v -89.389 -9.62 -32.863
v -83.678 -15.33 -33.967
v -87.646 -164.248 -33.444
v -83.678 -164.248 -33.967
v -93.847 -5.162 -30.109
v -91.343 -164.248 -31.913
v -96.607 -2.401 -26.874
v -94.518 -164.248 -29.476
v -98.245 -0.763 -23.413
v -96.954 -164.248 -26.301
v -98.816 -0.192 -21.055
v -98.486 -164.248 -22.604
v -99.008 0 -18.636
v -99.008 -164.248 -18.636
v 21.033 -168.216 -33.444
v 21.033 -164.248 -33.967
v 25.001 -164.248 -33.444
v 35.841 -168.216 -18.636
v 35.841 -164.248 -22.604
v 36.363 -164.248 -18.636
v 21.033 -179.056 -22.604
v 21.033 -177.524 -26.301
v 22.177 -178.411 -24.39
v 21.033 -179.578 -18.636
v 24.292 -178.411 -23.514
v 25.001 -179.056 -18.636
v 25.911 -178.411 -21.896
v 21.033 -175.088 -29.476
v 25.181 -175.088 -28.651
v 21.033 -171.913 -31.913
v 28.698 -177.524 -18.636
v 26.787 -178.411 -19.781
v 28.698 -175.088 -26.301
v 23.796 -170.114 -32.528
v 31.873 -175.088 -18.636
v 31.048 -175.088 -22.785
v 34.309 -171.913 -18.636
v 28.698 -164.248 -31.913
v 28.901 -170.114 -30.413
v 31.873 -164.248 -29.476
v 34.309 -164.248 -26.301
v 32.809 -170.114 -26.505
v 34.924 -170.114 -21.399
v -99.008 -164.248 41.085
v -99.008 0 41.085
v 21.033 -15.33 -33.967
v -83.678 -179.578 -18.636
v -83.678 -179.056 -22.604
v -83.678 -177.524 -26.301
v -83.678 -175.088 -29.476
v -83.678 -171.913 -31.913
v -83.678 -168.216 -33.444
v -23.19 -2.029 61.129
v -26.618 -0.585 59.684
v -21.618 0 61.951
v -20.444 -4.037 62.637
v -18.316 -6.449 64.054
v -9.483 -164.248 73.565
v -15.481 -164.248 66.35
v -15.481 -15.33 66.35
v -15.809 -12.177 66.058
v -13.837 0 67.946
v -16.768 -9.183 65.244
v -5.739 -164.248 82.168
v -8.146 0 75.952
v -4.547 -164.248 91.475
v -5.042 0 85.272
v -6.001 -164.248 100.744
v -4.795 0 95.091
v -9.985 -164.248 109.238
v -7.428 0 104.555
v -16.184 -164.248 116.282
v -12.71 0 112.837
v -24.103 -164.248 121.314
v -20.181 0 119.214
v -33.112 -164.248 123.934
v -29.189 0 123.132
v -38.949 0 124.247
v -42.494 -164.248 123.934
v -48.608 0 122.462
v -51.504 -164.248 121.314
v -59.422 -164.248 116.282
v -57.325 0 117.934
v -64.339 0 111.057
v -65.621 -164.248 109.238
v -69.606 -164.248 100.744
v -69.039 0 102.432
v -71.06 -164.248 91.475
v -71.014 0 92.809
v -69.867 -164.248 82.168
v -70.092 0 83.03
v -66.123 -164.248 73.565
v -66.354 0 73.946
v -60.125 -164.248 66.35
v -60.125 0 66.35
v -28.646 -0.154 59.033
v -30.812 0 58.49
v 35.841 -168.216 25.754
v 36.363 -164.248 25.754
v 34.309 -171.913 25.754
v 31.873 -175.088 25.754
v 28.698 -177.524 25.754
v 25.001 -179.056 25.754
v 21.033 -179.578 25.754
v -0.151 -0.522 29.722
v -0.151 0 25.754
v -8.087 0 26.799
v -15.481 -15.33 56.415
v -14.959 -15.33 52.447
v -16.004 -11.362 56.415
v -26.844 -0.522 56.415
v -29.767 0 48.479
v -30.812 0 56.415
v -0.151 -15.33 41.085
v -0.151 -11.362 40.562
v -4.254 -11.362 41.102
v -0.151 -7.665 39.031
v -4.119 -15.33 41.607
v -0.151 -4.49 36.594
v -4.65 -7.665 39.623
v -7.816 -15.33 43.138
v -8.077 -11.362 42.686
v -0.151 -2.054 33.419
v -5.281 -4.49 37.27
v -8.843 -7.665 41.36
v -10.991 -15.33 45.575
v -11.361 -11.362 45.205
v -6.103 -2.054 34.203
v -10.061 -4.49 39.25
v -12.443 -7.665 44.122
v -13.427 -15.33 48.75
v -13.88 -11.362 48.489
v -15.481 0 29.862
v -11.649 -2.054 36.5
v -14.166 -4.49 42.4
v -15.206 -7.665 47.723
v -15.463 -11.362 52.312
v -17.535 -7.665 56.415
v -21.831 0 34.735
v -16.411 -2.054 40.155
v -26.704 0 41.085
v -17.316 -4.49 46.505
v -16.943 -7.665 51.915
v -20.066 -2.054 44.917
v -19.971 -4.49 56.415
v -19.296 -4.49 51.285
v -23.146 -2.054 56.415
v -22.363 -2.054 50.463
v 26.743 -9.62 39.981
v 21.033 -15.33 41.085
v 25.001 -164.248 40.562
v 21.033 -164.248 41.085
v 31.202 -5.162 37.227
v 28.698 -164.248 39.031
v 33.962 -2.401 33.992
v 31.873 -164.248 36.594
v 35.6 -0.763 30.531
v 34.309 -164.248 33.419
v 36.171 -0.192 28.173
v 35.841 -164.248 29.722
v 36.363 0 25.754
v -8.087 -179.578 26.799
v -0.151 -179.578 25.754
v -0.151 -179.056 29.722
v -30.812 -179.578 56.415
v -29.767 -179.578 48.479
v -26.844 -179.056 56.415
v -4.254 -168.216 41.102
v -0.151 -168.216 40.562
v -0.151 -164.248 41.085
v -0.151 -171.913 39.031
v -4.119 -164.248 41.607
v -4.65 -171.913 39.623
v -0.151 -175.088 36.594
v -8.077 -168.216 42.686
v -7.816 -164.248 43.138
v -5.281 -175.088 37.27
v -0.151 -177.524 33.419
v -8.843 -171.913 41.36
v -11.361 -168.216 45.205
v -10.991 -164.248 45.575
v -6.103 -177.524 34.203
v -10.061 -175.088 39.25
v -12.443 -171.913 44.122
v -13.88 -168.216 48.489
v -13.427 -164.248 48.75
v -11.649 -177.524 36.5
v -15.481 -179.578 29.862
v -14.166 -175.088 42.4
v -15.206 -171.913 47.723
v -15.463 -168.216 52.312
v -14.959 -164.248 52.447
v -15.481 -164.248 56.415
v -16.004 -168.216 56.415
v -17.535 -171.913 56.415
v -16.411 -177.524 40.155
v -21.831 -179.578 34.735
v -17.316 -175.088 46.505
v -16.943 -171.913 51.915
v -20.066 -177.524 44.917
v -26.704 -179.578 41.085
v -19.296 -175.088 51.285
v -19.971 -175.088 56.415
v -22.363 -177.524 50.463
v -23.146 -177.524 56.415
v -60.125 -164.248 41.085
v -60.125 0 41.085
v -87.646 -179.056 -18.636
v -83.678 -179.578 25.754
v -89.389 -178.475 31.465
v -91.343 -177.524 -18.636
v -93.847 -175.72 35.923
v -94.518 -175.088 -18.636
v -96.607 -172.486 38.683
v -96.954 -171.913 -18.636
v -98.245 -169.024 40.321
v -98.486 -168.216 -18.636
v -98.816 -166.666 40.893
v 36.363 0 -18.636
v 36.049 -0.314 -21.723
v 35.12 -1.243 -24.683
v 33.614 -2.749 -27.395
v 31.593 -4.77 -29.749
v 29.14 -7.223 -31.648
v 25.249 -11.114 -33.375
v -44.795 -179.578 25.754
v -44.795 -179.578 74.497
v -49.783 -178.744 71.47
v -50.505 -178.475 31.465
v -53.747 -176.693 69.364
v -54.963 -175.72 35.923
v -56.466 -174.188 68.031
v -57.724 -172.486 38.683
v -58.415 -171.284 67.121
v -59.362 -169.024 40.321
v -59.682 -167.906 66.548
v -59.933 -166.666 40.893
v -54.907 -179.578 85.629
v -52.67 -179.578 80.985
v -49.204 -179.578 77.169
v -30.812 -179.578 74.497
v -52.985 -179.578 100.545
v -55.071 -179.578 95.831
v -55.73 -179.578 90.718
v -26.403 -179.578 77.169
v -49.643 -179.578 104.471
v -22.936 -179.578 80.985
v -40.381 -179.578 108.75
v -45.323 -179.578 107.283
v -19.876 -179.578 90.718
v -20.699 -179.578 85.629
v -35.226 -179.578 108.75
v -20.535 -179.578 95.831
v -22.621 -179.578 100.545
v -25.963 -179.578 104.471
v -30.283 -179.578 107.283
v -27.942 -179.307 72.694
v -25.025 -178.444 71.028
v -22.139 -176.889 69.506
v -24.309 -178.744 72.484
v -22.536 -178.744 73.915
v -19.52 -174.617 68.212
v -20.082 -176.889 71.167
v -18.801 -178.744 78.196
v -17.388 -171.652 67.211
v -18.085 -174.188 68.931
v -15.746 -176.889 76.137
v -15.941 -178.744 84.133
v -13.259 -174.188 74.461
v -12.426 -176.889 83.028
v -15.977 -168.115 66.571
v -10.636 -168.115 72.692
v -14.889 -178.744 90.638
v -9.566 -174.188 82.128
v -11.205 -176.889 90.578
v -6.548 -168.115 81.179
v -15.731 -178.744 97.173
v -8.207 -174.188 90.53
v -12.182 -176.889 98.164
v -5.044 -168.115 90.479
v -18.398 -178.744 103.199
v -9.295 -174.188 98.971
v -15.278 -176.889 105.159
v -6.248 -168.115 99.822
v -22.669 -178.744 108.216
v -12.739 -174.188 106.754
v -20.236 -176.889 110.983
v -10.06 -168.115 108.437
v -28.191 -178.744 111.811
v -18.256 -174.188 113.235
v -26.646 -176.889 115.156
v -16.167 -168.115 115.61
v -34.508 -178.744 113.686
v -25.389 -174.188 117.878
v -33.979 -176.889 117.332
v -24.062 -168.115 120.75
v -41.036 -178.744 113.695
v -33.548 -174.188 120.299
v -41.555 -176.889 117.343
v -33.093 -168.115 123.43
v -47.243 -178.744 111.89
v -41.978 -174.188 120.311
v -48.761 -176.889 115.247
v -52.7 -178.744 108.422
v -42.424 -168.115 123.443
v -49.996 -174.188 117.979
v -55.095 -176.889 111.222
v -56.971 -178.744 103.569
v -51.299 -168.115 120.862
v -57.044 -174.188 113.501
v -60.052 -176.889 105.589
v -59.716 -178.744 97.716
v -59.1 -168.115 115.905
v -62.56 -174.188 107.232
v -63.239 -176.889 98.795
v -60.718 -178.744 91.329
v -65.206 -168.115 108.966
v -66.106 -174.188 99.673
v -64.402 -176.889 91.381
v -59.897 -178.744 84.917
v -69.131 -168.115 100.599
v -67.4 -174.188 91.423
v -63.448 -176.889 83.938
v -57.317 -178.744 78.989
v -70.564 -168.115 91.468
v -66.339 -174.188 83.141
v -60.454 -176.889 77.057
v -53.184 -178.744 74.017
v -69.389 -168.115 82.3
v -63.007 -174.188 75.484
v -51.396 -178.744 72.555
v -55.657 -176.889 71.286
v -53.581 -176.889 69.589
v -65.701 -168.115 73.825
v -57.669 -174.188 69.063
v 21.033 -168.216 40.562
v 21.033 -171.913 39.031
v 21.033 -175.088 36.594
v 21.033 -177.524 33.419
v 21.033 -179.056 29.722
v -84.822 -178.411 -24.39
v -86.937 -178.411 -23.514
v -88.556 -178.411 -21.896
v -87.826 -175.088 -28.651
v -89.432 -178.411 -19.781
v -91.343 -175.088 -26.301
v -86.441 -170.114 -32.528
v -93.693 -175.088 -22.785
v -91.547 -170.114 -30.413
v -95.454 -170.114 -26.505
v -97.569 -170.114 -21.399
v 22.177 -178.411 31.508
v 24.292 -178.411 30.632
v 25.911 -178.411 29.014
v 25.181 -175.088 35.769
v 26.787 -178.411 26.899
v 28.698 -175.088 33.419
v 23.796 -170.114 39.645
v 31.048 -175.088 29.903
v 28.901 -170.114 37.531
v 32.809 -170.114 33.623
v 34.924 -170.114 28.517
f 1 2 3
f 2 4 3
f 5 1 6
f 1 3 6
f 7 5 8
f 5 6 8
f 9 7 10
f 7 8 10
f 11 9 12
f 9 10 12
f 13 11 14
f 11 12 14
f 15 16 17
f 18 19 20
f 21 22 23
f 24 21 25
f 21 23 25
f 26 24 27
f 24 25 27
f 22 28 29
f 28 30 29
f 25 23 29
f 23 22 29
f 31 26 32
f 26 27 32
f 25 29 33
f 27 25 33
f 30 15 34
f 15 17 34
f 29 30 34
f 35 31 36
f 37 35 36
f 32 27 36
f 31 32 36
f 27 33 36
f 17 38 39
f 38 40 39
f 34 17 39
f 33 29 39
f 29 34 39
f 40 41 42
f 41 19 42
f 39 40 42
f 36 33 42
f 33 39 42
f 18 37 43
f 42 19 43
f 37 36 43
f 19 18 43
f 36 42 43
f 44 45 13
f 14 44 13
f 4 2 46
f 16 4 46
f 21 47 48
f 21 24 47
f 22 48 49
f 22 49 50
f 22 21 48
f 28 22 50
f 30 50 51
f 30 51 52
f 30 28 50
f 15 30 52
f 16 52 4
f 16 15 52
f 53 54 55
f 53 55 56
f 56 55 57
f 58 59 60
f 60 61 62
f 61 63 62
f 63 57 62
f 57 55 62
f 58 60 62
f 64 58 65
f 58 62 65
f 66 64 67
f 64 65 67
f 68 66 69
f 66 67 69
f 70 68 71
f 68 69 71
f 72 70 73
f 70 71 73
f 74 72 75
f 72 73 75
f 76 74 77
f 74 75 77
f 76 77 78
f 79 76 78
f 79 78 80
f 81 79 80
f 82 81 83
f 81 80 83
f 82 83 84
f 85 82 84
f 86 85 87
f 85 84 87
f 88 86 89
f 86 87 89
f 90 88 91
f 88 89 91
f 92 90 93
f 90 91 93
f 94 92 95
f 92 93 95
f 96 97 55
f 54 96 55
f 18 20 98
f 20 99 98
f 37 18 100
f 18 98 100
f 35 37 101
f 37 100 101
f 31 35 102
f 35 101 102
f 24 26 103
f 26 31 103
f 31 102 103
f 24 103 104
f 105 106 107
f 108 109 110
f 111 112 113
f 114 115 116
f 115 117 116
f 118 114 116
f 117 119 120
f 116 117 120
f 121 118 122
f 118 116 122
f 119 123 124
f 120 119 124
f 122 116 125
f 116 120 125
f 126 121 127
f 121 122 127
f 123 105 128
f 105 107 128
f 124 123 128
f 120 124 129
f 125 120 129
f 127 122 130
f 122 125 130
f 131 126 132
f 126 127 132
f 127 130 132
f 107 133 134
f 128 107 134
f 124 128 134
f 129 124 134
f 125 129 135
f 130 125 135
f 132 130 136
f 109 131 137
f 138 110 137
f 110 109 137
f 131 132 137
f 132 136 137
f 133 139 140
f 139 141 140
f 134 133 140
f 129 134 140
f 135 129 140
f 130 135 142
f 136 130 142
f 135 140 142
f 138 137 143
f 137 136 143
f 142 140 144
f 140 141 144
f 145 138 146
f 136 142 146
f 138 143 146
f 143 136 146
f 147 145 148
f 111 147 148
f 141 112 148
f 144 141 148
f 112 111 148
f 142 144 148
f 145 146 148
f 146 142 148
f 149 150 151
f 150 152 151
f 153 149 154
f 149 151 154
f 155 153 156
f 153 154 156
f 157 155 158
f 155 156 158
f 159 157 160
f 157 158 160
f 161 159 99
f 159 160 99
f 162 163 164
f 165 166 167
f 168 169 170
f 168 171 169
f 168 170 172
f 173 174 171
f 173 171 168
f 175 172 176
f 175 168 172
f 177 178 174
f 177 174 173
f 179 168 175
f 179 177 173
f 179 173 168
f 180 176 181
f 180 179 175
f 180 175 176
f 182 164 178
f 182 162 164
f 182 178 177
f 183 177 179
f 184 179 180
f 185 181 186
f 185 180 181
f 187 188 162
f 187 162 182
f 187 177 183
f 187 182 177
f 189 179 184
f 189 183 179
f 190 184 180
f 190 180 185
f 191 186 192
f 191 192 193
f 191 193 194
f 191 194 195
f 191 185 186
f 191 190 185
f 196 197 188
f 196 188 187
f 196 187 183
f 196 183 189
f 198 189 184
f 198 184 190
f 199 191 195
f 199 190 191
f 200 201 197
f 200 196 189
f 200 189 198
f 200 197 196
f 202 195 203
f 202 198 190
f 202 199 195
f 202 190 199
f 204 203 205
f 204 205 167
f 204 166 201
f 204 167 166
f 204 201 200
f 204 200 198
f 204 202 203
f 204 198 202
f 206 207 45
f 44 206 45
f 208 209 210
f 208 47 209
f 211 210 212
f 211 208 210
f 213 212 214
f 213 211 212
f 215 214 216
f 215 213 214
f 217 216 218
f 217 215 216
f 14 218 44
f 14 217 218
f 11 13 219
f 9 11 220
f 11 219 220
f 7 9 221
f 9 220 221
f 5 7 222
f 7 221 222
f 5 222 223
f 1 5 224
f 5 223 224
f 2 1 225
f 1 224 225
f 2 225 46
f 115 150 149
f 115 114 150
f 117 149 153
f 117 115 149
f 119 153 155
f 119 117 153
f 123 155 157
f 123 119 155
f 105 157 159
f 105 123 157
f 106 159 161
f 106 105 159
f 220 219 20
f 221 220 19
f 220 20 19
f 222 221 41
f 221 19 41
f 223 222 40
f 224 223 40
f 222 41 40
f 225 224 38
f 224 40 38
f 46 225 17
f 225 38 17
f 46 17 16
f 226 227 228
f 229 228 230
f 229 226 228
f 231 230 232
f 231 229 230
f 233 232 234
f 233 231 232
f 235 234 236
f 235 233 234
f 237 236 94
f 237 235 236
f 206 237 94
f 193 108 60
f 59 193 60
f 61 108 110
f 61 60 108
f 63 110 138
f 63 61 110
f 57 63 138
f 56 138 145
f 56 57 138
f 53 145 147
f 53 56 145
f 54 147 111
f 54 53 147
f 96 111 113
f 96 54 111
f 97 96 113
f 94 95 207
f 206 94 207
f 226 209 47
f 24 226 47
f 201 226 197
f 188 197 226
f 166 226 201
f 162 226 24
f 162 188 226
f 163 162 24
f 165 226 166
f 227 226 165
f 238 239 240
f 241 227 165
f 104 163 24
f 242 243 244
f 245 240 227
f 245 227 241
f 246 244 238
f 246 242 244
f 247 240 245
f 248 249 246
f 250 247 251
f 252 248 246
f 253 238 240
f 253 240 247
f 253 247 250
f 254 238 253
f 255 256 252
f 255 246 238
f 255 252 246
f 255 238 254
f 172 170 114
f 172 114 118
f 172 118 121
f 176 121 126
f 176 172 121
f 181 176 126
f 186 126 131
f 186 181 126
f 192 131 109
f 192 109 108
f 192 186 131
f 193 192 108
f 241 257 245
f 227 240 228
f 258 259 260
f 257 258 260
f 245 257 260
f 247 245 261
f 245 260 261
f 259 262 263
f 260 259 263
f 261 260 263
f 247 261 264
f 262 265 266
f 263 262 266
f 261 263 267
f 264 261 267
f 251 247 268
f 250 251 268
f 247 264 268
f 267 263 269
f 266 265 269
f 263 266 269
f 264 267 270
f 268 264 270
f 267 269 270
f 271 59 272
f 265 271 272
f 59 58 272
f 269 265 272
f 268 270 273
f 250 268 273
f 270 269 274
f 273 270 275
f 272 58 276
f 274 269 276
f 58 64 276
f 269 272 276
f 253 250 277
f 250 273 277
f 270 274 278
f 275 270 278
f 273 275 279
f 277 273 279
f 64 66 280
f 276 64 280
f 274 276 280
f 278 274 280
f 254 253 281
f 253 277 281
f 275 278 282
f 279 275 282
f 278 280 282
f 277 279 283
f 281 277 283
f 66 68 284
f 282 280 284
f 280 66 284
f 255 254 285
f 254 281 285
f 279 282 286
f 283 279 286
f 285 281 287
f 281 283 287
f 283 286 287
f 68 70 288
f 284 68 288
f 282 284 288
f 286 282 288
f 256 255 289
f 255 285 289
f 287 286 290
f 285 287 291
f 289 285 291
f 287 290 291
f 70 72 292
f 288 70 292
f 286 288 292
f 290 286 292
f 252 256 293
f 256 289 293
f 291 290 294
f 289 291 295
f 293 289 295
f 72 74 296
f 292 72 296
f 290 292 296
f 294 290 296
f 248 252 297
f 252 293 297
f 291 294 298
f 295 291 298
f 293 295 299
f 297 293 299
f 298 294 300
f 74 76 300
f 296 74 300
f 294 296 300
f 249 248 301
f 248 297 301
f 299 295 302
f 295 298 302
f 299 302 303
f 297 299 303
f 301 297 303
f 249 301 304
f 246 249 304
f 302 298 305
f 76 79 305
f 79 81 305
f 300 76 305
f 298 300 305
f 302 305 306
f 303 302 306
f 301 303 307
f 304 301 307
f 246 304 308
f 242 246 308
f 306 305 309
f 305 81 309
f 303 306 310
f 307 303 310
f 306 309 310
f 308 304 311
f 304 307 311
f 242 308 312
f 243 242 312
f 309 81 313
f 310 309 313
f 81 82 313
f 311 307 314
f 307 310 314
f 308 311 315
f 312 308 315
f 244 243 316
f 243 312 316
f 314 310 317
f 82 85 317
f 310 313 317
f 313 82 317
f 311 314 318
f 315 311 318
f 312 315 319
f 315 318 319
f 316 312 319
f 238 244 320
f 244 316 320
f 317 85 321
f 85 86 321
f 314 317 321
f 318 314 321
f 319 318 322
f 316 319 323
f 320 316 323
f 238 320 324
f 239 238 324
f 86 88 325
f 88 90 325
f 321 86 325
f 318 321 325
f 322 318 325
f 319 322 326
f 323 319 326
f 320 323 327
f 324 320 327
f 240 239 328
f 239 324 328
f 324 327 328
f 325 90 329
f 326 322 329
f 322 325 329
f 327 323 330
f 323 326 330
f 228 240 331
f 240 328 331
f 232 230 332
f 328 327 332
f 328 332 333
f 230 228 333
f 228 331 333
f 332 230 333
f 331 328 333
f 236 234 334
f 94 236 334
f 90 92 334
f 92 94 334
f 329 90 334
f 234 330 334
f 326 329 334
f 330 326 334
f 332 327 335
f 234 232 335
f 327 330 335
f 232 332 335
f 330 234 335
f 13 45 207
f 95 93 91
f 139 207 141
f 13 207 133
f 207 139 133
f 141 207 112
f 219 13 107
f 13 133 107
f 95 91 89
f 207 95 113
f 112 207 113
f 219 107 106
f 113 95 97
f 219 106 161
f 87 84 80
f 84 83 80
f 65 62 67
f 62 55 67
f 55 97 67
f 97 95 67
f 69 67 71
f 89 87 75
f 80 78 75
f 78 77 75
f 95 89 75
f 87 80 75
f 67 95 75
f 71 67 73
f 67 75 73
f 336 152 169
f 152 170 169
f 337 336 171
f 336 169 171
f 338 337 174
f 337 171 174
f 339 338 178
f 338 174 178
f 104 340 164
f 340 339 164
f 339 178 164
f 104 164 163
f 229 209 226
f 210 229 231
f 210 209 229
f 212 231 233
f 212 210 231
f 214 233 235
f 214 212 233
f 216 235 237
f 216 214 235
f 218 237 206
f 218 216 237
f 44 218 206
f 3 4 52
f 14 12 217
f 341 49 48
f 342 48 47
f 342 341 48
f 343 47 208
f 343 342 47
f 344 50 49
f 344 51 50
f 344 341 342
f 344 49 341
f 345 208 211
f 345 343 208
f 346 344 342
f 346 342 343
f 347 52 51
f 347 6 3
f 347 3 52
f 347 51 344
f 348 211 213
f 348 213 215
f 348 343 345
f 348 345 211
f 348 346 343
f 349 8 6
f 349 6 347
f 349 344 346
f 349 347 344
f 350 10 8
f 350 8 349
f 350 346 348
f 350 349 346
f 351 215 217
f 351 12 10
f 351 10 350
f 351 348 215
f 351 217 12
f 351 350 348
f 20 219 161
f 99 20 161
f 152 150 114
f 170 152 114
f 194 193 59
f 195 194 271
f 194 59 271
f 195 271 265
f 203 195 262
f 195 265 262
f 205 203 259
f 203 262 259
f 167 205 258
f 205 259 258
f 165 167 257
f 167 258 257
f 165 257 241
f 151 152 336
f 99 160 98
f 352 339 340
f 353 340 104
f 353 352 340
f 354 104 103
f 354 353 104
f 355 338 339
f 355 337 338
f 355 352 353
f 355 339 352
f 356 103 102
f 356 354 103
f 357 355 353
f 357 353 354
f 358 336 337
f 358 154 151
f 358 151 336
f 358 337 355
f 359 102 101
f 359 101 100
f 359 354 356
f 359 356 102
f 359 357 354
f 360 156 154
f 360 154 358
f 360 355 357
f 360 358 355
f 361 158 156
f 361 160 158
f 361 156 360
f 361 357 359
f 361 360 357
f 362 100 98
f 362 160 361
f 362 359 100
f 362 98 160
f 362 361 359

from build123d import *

# Parameters (mm, degrees)
F1_DEPTH = 179.578
F2_F1_R  = 15.3302561211
F2_F2_R  = 15.3302561211


with BuildPart() as f1:
    # F0 (on Front) → F1 (new body)
    with BuildSketch(Plane.XZ):
        with BuildLine():
            Line((-60.1250007749, 41.0845763981), (-99.0082323551, 41.0845763981))
            Line((-99.0082323551, 41.0845763981), (-99.0082323551, -33.9665971696))
            Line((-99.0082323551, -33.9665971696), (36.3630242646, -33.9665971696))
            Line((36.3630242646, -33.9665971696), (36.3630242646, 41.0845763981))
            Line((36.3630242646, 41.0845763981), (-15.4812876135, 41.0845763981))
            Line((-15.4812876135, 41.0845763981), (-15.4812876135, 66.3503706455))
            ThreePointArc((-15.4812876135, 66.3503706455), (-37.8031441942, 124.2664472866), (-60.1250007749, 66.3503706455))
            Line((-60.1250007749, 66.3503706455), (-60.1250007749, 41.0845763981))
        make_face()
    extrude(amount=F1_DEPTH)

    # F2: fillet of radius 15.3302561211 on 14 edges, made by hand

    # F2_f1
    f2_f1_edges = [f1.edges().sort_by_distance(p)[0] for p in [
        (-15.4812876135, -89.789, 41.0845763981),
    ]]
    fillet(f2_f1_edges, radius=F2_F1_R)

    # F2_f2
    f2_f2_edges = [f1.edges().sort_by_distance(p)[0] for p in [
        (36.3630242646, -89.789, 41.0845763981),
        (18.1059963861, 0, 41.0845763981),
        (18.1059963861, -179.578, 41.0845763981),
        (-99.0082323551, -89.789, -33.9665971696),
        (36.3630242646, -89.789, -33.9665971696),
        (-31.3226040453, 0, -33.9665971696),
        (-31.3226040453, -179.578, -33.9665971696),
        (-37.8031441942, -179.578, 124.2664472866),
        (-60.1250007749, -179.578, 53.7174735218),
        (-79.566616565, -179.578, 41.0845763981),
        (-99.0082323551, -179.578, 3.5589896142),
        (36.3630242646, -179.578, 3.5589896142),
        (-15.4812876135, -179.578, 61.3826015824),
        (-10.991159553, -179.578, 45.5747044587),
        (-10.991159553, 0, 45.5747044587),
    ]]
    fillet(f2_f2_edges, radius=F2_F2_R)


solid = f1.part
